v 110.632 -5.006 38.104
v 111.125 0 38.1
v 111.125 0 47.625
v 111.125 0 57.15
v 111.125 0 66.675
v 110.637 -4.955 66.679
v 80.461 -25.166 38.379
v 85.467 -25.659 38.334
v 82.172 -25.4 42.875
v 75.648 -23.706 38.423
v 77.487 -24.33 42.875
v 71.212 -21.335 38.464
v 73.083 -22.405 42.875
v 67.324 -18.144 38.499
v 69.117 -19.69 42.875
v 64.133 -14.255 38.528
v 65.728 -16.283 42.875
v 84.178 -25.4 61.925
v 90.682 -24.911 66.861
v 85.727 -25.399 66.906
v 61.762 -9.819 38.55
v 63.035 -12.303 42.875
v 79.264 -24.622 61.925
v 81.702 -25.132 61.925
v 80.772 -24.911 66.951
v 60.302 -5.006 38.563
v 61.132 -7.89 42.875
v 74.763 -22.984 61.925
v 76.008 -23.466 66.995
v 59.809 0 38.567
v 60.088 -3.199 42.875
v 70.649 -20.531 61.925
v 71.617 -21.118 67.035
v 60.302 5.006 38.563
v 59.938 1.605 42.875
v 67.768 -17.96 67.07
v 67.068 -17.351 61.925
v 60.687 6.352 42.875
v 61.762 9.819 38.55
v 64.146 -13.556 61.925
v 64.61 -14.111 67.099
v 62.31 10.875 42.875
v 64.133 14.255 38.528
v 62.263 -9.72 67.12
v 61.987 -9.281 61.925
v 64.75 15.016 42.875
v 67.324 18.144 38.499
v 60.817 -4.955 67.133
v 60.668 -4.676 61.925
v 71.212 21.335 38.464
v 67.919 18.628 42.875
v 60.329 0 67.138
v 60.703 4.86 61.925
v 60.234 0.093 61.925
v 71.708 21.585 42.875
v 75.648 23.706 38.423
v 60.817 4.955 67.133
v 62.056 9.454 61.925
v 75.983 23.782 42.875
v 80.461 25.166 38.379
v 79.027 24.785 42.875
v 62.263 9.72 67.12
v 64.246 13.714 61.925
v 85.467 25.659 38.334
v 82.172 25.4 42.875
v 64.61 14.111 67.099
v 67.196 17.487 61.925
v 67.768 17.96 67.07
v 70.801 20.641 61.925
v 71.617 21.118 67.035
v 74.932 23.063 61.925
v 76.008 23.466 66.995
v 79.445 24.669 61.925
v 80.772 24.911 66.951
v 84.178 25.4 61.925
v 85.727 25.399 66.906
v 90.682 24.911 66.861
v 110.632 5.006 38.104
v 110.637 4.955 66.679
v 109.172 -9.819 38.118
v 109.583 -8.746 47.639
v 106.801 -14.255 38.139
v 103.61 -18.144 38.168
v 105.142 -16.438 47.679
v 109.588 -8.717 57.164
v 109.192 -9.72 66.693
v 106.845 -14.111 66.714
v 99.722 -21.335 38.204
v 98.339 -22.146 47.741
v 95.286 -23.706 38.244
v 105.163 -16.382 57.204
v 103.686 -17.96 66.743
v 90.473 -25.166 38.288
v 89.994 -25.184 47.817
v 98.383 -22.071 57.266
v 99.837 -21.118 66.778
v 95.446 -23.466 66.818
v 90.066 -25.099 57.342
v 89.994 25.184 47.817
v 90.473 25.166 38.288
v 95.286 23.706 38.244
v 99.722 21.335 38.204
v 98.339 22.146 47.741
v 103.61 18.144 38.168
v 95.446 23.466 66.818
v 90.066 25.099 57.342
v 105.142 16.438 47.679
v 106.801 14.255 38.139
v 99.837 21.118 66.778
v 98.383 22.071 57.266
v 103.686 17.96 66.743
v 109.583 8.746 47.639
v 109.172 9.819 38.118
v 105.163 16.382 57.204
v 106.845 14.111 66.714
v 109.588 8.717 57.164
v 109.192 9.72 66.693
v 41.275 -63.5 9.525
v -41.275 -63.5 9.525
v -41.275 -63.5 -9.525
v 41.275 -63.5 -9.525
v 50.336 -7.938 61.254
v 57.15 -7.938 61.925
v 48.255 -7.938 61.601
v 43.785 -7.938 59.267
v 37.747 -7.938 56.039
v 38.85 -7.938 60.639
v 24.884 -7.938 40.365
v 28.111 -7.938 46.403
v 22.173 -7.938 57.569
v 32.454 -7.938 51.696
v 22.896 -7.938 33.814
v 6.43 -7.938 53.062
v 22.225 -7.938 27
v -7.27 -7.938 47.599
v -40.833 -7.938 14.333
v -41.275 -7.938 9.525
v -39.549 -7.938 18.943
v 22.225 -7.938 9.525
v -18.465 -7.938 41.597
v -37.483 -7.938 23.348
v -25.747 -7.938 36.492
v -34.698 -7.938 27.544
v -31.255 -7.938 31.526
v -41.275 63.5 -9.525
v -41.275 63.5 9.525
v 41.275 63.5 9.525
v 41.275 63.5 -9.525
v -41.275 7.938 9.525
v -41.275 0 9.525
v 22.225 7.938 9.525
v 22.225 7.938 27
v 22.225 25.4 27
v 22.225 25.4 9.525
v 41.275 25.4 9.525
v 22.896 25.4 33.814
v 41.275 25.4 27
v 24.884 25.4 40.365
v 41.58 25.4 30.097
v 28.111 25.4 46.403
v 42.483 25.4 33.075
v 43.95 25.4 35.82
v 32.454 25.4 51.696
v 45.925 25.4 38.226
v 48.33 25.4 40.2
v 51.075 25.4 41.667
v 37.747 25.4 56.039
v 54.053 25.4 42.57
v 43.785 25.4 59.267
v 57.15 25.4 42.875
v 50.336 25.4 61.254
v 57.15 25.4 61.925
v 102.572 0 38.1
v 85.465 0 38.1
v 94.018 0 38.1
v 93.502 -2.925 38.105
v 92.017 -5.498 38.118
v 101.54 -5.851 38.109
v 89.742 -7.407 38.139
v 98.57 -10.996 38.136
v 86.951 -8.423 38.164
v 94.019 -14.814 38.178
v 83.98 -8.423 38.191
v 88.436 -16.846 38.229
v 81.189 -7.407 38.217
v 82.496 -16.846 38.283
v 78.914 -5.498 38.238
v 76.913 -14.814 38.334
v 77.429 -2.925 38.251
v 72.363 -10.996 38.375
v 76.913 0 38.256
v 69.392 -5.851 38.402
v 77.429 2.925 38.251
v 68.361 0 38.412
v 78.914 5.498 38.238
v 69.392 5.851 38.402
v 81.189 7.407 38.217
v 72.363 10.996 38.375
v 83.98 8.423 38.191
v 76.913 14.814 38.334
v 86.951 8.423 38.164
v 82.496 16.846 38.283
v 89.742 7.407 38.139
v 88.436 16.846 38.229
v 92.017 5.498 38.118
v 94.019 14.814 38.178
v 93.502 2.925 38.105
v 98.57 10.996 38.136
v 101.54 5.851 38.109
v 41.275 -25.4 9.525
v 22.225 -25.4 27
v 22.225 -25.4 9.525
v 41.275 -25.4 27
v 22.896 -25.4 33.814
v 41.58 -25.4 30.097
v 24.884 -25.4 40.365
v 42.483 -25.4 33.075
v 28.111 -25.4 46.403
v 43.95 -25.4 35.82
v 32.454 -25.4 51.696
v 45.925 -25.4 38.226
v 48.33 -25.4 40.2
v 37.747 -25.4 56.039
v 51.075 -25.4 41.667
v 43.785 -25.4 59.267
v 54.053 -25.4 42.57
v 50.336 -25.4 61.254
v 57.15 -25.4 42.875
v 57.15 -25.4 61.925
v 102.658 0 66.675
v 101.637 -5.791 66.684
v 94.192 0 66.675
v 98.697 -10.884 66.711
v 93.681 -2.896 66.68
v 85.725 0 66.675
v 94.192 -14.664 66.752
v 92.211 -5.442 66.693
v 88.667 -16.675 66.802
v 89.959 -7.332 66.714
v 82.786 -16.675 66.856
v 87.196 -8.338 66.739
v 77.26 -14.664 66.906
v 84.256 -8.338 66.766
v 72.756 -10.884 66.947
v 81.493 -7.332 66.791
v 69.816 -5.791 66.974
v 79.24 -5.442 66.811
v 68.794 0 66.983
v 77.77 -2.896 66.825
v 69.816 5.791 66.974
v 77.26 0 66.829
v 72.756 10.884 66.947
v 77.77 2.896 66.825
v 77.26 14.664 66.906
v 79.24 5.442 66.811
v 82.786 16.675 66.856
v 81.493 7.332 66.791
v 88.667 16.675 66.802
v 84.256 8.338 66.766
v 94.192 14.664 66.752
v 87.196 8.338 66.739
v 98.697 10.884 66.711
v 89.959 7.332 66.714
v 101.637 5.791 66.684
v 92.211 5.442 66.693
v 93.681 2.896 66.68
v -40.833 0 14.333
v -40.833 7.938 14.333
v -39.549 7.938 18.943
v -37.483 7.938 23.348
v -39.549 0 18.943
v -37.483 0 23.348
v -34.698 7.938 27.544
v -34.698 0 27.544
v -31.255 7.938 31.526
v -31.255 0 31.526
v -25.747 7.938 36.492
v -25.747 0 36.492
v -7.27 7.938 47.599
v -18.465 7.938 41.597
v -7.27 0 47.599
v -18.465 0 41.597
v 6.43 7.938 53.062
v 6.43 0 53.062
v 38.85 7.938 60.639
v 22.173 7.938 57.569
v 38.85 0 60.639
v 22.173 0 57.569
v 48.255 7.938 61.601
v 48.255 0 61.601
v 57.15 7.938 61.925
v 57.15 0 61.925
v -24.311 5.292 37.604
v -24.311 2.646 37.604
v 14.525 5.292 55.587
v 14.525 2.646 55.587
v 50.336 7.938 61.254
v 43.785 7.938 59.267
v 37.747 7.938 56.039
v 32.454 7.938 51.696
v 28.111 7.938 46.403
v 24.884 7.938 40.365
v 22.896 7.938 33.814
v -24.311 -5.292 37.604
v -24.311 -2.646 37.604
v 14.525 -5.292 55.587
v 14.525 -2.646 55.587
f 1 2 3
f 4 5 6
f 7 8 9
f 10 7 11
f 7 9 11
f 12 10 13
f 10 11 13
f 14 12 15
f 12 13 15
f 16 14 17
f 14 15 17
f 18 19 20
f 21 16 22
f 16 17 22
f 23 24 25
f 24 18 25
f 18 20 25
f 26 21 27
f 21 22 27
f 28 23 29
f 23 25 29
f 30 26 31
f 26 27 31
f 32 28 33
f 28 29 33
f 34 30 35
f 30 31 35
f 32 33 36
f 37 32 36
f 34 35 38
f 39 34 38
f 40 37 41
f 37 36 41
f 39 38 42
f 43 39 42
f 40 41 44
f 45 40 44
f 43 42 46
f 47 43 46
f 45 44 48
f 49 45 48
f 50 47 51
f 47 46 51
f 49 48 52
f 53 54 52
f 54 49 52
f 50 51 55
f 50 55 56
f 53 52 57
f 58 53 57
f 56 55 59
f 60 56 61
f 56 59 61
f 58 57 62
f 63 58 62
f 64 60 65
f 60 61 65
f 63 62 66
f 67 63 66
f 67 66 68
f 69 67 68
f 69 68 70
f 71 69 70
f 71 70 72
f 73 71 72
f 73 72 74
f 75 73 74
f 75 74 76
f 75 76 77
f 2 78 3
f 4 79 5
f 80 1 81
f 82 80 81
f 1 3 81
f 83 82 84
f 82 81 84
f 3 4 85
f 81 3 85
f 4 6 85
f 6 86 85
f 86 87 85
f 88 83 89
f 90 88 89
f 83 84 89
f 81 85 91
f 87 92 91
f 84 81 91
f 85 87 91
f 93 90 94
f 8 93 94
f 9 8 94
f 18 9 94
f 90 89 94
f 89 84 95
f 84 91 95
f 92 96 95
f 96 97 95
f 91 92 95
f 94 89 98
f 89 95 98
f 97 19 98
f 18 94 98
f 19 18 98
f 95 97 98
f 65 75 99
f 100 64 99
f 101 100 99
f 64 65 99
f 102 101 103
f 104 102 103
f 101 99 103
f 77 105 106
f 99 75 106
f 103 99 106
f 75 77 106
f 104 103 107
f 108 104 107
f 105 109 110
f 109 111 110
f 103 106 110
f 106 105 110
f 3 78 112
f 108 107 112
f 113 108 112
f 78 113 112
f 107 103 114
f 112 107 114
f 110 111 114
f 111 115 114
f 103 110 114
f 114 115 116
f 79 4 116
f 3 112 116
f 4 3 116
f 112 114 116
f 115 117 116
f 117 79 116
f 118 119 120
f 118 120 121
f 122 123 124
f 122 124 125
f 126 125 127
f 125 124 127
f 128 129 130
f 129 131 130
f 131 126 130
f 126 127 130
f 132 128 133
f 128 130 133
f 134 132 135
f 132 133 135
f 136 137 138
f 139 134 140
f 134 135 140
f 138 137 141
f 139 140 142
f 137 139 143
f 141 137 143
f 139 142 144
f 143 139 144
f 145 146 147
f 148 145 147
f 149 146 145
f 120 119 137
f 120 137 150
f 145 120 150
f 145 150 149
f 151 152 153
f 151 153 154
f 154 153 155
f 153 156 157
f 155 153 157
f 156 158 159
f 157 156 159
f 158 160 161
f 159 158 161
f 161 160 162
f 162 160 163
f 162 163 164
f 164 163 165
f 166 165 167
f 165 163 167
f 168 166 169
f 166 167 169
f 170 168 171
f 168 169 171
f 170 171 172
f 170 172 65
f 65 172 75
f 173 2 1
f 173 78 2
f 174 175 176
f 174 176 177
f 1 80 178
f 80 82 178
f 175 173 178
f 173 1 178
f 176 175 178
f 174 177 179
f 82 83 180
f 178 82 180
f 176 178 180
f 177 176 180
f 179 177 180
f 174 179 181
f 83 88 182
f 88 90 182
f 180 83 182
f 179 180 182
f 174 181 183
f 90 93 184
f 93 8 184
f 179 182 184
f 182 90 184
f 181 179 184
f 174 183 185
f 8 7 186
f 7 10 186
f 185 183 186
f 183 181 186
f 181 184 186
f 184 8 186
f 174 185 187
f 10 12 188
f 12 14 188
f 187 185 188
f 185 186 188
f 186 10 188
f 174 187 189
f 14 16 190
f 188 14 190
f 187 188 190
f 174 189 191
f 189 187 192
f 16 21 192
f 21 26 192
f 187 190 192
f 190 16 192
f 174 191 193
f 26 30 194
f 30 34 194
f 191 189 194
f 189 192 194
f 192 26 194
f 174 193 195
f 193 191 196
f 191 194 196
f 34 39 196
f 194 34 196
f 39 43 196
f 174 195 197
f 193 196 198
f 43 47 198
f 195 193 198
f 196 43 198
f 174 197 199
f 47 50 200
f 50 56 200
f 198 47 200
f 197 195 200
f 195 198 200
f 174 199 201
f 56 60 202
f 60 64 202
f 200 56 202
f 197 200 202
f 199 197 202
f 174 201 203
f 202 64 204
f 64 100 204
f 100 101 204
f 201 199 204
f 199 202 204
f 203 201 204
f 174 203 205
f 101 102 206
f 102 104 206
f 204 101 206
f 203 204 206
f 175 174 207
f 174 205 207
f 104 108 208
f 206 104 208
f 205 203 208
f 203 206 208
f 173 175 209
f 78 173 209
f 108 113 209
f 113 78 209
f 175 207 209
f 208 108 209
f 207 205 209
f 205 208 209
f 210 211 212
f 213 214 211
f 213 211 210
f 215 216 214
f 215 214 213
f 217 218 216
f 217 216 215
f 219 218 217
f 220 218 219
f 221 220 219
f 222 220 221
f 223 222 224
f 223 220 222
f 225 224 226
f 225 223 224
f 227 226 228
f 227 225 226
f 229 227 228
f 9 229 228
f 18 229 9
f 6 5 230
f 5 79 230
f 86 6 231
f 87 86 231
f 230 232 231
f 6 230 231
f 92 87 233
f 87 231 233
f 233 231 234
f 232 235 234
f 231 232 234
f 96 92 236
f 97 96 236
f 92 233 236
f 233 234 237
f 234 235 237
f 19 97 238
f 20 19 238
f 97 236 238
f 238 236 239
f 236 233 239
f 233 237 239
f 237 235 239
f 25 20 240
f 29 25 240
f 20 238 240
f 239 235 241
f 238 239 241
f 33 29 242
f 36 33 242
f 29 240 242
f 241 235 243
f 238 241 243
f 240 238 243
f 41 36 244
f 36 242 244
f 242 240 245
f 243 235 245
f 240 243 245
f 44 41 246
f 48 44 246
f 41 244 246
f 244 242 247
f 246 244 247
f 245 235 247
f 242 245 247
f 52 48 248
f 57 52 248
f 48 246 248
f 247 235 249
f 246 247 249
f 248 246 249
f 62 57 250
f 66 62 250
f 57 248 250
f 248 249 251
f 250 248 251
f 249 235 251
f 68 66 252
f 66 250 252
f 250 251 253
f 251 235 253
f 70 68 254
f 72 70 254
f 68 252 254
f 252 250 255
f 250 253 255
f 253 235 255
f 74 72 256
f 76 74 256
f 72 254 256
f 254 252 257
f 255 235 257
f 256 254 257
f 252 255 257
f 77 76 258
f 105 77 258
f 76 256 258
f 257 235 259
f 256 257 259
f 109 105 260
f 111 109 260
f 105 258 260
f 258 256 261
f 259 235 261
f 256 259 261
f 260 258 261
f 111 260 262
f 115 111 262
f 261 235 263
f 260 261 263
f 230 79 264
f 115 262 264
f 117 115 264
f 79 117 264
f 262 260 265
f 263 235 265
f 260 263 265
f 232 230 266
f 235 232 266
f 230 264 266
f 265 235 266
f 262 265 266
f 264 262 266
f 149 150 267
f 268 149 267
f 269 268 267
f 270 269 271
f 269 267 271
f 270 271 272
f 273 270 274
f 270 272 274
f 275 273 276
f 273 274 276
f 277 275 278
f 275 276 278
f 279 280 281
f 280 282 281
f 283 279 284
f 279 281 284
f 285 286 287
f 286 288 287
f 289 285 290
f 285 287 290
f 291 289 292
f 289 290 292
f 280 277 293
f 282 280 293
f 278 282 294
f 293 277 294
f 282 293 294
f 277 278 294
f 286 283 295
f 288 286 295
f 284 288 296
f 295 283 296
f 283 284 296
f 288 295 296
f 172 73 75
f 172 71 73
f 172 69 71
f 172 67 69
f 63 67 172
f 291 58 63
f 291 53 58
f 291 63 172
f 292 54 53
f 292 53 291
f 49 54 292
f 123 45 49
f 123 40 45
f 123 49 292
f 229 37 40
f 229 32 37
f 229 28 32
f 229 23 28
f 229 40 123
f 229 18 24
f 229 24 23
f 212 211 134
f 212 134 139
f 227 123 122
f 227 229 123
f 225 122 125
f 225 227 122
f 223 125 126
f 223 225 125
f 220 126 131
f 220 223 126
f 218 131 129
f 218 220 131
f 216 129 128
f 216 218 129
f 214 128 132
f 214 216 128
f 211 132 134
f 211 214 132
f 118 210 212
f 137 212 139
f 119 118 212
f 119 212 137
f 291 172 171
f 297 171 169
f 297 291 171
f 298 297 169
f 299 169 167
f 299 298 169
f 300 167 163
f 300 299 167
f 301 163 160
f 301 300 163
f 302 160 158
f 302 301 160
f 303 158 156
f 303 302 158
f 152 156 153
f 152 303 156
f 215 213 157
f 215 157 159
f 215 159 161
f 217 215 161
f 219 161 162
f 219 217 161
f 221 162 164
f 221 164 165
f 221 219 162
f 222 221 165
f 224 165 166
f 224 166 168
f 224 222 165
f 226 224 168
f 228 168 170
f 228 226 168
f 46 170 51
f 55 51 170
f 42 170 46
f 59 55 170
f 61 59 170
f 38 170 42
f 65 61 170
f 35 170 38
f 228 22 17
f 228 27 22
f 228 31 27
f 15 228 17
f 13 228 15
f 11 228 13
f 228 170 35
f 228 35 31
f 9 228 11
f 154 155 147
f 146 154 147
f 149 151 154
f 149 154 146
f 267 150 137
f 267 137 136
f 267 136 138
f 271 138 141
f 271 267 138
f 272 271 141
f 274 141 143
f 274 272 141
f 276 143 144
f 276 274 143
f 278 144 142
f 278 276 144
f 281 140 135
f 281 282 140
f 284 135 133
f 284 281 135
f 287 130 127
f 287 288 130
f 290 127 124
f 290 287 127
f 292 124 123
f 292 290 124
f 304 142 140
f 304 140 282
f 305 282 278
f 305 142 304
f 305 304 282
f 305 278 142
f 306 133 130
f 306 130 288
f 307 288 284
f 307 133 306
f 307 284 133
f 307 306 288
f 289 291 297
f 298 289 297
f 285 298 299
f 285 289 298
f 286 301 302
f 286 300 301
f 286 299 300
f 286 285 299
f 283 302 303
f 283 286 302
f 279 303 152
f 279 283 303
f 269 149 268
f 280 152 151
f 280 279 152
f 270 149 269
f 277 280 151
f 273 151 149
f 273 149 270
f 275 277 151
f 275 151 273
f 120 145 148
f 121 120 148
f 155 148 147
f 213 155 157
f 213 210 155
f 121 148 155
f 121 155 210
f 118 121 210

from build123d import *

# Parameters (mm, degrees)
F1_DEPTH = 63.5
F0_W     = 25.1397234082
F0_H     = 19.05
F2_DEPTH = 25.4
F3_DEPTH = 7.9375


with BuildPart() as f1:
    # F0 (on Front) → F1 (new body, symmetric)
    with BuildSketch(Plane.XZ):
        Polygon((-41.275, 9.525), (-41.275, -9.525), (41.275, -9.525), (41.275, 9.525), (22.225, 9.525), align=None)
    extrude(amount=F1_DEPTH, both=True)

    # F0 (on Front) → F2 (join, symmetric)
    with BuildSketch(Plane.XZ):
        with BuildLine():
            Line((22.225, 9.525), (41.275, 9.525))
            Line((41.275, 9.525), (41.275, 27.0002))
            ThreePointArc((41.275, 27.0002), (45.9246798487, 38.2255201513), (57.15, 42.8752))
            Line((57.15, 42.8752), (60.325, 42.8752))
            Line((60.325, 42.8752), (60.325, 61.9252))
            Line((60.325, 61.9252), (57.15, 61.9252))
            ThreePointArc((57.15, 61.9252), (32.4542956671, 51.6959043329), (22.225, 27.0002))
            Line((22.225, 27.0002), (22.225, 9.525))
        make_face()
        with Locations((72.8948617041, 52.4002)):
            Rectangle(F0_W, F0_H)
    extrude(amount=F2_DEPTH, both=True)

    # F0 (on Front) → F3 (join, symmetric)
    with BuildSketch(Plane.XZ):
        with BuildLine():
            add(Edge.make_bspline(
                [(-41.275, 9.525), (-41.275, 42.1362832522), (18.6590275409, 61.9252), (57.15, 61.9252)],
                knots=[0, 0, 0, 0, 111.5045361635, 111.5045361635, 111.5045361635, 111.5045361635], degree=3))
            Line((-41.275, 9.525), (22.225, 9.525))
            Line((22.225, 9.525), (22.225, 27.0002))
            ThreePointArc((22.225, 27.0002), (32.4542956671, 51.6959043329), (57.15, 61.9252))
        make_face()
    extrude(amount=F3_DEPTH, both=True)

    # F0 (on Front) → F4 (revolve)
    with BuildSketch(Plane.XZ):
        Polygon((111.125, 66.675), (85.725, 66.675), (85.4647234082, 38.1), (111.125, 38.1), align=None)
    revolve(axis=Axis((85.5948617041, 0, 52.3875), (-0.0091081643, 0, -0.9999585198)))


solid = f1.part
